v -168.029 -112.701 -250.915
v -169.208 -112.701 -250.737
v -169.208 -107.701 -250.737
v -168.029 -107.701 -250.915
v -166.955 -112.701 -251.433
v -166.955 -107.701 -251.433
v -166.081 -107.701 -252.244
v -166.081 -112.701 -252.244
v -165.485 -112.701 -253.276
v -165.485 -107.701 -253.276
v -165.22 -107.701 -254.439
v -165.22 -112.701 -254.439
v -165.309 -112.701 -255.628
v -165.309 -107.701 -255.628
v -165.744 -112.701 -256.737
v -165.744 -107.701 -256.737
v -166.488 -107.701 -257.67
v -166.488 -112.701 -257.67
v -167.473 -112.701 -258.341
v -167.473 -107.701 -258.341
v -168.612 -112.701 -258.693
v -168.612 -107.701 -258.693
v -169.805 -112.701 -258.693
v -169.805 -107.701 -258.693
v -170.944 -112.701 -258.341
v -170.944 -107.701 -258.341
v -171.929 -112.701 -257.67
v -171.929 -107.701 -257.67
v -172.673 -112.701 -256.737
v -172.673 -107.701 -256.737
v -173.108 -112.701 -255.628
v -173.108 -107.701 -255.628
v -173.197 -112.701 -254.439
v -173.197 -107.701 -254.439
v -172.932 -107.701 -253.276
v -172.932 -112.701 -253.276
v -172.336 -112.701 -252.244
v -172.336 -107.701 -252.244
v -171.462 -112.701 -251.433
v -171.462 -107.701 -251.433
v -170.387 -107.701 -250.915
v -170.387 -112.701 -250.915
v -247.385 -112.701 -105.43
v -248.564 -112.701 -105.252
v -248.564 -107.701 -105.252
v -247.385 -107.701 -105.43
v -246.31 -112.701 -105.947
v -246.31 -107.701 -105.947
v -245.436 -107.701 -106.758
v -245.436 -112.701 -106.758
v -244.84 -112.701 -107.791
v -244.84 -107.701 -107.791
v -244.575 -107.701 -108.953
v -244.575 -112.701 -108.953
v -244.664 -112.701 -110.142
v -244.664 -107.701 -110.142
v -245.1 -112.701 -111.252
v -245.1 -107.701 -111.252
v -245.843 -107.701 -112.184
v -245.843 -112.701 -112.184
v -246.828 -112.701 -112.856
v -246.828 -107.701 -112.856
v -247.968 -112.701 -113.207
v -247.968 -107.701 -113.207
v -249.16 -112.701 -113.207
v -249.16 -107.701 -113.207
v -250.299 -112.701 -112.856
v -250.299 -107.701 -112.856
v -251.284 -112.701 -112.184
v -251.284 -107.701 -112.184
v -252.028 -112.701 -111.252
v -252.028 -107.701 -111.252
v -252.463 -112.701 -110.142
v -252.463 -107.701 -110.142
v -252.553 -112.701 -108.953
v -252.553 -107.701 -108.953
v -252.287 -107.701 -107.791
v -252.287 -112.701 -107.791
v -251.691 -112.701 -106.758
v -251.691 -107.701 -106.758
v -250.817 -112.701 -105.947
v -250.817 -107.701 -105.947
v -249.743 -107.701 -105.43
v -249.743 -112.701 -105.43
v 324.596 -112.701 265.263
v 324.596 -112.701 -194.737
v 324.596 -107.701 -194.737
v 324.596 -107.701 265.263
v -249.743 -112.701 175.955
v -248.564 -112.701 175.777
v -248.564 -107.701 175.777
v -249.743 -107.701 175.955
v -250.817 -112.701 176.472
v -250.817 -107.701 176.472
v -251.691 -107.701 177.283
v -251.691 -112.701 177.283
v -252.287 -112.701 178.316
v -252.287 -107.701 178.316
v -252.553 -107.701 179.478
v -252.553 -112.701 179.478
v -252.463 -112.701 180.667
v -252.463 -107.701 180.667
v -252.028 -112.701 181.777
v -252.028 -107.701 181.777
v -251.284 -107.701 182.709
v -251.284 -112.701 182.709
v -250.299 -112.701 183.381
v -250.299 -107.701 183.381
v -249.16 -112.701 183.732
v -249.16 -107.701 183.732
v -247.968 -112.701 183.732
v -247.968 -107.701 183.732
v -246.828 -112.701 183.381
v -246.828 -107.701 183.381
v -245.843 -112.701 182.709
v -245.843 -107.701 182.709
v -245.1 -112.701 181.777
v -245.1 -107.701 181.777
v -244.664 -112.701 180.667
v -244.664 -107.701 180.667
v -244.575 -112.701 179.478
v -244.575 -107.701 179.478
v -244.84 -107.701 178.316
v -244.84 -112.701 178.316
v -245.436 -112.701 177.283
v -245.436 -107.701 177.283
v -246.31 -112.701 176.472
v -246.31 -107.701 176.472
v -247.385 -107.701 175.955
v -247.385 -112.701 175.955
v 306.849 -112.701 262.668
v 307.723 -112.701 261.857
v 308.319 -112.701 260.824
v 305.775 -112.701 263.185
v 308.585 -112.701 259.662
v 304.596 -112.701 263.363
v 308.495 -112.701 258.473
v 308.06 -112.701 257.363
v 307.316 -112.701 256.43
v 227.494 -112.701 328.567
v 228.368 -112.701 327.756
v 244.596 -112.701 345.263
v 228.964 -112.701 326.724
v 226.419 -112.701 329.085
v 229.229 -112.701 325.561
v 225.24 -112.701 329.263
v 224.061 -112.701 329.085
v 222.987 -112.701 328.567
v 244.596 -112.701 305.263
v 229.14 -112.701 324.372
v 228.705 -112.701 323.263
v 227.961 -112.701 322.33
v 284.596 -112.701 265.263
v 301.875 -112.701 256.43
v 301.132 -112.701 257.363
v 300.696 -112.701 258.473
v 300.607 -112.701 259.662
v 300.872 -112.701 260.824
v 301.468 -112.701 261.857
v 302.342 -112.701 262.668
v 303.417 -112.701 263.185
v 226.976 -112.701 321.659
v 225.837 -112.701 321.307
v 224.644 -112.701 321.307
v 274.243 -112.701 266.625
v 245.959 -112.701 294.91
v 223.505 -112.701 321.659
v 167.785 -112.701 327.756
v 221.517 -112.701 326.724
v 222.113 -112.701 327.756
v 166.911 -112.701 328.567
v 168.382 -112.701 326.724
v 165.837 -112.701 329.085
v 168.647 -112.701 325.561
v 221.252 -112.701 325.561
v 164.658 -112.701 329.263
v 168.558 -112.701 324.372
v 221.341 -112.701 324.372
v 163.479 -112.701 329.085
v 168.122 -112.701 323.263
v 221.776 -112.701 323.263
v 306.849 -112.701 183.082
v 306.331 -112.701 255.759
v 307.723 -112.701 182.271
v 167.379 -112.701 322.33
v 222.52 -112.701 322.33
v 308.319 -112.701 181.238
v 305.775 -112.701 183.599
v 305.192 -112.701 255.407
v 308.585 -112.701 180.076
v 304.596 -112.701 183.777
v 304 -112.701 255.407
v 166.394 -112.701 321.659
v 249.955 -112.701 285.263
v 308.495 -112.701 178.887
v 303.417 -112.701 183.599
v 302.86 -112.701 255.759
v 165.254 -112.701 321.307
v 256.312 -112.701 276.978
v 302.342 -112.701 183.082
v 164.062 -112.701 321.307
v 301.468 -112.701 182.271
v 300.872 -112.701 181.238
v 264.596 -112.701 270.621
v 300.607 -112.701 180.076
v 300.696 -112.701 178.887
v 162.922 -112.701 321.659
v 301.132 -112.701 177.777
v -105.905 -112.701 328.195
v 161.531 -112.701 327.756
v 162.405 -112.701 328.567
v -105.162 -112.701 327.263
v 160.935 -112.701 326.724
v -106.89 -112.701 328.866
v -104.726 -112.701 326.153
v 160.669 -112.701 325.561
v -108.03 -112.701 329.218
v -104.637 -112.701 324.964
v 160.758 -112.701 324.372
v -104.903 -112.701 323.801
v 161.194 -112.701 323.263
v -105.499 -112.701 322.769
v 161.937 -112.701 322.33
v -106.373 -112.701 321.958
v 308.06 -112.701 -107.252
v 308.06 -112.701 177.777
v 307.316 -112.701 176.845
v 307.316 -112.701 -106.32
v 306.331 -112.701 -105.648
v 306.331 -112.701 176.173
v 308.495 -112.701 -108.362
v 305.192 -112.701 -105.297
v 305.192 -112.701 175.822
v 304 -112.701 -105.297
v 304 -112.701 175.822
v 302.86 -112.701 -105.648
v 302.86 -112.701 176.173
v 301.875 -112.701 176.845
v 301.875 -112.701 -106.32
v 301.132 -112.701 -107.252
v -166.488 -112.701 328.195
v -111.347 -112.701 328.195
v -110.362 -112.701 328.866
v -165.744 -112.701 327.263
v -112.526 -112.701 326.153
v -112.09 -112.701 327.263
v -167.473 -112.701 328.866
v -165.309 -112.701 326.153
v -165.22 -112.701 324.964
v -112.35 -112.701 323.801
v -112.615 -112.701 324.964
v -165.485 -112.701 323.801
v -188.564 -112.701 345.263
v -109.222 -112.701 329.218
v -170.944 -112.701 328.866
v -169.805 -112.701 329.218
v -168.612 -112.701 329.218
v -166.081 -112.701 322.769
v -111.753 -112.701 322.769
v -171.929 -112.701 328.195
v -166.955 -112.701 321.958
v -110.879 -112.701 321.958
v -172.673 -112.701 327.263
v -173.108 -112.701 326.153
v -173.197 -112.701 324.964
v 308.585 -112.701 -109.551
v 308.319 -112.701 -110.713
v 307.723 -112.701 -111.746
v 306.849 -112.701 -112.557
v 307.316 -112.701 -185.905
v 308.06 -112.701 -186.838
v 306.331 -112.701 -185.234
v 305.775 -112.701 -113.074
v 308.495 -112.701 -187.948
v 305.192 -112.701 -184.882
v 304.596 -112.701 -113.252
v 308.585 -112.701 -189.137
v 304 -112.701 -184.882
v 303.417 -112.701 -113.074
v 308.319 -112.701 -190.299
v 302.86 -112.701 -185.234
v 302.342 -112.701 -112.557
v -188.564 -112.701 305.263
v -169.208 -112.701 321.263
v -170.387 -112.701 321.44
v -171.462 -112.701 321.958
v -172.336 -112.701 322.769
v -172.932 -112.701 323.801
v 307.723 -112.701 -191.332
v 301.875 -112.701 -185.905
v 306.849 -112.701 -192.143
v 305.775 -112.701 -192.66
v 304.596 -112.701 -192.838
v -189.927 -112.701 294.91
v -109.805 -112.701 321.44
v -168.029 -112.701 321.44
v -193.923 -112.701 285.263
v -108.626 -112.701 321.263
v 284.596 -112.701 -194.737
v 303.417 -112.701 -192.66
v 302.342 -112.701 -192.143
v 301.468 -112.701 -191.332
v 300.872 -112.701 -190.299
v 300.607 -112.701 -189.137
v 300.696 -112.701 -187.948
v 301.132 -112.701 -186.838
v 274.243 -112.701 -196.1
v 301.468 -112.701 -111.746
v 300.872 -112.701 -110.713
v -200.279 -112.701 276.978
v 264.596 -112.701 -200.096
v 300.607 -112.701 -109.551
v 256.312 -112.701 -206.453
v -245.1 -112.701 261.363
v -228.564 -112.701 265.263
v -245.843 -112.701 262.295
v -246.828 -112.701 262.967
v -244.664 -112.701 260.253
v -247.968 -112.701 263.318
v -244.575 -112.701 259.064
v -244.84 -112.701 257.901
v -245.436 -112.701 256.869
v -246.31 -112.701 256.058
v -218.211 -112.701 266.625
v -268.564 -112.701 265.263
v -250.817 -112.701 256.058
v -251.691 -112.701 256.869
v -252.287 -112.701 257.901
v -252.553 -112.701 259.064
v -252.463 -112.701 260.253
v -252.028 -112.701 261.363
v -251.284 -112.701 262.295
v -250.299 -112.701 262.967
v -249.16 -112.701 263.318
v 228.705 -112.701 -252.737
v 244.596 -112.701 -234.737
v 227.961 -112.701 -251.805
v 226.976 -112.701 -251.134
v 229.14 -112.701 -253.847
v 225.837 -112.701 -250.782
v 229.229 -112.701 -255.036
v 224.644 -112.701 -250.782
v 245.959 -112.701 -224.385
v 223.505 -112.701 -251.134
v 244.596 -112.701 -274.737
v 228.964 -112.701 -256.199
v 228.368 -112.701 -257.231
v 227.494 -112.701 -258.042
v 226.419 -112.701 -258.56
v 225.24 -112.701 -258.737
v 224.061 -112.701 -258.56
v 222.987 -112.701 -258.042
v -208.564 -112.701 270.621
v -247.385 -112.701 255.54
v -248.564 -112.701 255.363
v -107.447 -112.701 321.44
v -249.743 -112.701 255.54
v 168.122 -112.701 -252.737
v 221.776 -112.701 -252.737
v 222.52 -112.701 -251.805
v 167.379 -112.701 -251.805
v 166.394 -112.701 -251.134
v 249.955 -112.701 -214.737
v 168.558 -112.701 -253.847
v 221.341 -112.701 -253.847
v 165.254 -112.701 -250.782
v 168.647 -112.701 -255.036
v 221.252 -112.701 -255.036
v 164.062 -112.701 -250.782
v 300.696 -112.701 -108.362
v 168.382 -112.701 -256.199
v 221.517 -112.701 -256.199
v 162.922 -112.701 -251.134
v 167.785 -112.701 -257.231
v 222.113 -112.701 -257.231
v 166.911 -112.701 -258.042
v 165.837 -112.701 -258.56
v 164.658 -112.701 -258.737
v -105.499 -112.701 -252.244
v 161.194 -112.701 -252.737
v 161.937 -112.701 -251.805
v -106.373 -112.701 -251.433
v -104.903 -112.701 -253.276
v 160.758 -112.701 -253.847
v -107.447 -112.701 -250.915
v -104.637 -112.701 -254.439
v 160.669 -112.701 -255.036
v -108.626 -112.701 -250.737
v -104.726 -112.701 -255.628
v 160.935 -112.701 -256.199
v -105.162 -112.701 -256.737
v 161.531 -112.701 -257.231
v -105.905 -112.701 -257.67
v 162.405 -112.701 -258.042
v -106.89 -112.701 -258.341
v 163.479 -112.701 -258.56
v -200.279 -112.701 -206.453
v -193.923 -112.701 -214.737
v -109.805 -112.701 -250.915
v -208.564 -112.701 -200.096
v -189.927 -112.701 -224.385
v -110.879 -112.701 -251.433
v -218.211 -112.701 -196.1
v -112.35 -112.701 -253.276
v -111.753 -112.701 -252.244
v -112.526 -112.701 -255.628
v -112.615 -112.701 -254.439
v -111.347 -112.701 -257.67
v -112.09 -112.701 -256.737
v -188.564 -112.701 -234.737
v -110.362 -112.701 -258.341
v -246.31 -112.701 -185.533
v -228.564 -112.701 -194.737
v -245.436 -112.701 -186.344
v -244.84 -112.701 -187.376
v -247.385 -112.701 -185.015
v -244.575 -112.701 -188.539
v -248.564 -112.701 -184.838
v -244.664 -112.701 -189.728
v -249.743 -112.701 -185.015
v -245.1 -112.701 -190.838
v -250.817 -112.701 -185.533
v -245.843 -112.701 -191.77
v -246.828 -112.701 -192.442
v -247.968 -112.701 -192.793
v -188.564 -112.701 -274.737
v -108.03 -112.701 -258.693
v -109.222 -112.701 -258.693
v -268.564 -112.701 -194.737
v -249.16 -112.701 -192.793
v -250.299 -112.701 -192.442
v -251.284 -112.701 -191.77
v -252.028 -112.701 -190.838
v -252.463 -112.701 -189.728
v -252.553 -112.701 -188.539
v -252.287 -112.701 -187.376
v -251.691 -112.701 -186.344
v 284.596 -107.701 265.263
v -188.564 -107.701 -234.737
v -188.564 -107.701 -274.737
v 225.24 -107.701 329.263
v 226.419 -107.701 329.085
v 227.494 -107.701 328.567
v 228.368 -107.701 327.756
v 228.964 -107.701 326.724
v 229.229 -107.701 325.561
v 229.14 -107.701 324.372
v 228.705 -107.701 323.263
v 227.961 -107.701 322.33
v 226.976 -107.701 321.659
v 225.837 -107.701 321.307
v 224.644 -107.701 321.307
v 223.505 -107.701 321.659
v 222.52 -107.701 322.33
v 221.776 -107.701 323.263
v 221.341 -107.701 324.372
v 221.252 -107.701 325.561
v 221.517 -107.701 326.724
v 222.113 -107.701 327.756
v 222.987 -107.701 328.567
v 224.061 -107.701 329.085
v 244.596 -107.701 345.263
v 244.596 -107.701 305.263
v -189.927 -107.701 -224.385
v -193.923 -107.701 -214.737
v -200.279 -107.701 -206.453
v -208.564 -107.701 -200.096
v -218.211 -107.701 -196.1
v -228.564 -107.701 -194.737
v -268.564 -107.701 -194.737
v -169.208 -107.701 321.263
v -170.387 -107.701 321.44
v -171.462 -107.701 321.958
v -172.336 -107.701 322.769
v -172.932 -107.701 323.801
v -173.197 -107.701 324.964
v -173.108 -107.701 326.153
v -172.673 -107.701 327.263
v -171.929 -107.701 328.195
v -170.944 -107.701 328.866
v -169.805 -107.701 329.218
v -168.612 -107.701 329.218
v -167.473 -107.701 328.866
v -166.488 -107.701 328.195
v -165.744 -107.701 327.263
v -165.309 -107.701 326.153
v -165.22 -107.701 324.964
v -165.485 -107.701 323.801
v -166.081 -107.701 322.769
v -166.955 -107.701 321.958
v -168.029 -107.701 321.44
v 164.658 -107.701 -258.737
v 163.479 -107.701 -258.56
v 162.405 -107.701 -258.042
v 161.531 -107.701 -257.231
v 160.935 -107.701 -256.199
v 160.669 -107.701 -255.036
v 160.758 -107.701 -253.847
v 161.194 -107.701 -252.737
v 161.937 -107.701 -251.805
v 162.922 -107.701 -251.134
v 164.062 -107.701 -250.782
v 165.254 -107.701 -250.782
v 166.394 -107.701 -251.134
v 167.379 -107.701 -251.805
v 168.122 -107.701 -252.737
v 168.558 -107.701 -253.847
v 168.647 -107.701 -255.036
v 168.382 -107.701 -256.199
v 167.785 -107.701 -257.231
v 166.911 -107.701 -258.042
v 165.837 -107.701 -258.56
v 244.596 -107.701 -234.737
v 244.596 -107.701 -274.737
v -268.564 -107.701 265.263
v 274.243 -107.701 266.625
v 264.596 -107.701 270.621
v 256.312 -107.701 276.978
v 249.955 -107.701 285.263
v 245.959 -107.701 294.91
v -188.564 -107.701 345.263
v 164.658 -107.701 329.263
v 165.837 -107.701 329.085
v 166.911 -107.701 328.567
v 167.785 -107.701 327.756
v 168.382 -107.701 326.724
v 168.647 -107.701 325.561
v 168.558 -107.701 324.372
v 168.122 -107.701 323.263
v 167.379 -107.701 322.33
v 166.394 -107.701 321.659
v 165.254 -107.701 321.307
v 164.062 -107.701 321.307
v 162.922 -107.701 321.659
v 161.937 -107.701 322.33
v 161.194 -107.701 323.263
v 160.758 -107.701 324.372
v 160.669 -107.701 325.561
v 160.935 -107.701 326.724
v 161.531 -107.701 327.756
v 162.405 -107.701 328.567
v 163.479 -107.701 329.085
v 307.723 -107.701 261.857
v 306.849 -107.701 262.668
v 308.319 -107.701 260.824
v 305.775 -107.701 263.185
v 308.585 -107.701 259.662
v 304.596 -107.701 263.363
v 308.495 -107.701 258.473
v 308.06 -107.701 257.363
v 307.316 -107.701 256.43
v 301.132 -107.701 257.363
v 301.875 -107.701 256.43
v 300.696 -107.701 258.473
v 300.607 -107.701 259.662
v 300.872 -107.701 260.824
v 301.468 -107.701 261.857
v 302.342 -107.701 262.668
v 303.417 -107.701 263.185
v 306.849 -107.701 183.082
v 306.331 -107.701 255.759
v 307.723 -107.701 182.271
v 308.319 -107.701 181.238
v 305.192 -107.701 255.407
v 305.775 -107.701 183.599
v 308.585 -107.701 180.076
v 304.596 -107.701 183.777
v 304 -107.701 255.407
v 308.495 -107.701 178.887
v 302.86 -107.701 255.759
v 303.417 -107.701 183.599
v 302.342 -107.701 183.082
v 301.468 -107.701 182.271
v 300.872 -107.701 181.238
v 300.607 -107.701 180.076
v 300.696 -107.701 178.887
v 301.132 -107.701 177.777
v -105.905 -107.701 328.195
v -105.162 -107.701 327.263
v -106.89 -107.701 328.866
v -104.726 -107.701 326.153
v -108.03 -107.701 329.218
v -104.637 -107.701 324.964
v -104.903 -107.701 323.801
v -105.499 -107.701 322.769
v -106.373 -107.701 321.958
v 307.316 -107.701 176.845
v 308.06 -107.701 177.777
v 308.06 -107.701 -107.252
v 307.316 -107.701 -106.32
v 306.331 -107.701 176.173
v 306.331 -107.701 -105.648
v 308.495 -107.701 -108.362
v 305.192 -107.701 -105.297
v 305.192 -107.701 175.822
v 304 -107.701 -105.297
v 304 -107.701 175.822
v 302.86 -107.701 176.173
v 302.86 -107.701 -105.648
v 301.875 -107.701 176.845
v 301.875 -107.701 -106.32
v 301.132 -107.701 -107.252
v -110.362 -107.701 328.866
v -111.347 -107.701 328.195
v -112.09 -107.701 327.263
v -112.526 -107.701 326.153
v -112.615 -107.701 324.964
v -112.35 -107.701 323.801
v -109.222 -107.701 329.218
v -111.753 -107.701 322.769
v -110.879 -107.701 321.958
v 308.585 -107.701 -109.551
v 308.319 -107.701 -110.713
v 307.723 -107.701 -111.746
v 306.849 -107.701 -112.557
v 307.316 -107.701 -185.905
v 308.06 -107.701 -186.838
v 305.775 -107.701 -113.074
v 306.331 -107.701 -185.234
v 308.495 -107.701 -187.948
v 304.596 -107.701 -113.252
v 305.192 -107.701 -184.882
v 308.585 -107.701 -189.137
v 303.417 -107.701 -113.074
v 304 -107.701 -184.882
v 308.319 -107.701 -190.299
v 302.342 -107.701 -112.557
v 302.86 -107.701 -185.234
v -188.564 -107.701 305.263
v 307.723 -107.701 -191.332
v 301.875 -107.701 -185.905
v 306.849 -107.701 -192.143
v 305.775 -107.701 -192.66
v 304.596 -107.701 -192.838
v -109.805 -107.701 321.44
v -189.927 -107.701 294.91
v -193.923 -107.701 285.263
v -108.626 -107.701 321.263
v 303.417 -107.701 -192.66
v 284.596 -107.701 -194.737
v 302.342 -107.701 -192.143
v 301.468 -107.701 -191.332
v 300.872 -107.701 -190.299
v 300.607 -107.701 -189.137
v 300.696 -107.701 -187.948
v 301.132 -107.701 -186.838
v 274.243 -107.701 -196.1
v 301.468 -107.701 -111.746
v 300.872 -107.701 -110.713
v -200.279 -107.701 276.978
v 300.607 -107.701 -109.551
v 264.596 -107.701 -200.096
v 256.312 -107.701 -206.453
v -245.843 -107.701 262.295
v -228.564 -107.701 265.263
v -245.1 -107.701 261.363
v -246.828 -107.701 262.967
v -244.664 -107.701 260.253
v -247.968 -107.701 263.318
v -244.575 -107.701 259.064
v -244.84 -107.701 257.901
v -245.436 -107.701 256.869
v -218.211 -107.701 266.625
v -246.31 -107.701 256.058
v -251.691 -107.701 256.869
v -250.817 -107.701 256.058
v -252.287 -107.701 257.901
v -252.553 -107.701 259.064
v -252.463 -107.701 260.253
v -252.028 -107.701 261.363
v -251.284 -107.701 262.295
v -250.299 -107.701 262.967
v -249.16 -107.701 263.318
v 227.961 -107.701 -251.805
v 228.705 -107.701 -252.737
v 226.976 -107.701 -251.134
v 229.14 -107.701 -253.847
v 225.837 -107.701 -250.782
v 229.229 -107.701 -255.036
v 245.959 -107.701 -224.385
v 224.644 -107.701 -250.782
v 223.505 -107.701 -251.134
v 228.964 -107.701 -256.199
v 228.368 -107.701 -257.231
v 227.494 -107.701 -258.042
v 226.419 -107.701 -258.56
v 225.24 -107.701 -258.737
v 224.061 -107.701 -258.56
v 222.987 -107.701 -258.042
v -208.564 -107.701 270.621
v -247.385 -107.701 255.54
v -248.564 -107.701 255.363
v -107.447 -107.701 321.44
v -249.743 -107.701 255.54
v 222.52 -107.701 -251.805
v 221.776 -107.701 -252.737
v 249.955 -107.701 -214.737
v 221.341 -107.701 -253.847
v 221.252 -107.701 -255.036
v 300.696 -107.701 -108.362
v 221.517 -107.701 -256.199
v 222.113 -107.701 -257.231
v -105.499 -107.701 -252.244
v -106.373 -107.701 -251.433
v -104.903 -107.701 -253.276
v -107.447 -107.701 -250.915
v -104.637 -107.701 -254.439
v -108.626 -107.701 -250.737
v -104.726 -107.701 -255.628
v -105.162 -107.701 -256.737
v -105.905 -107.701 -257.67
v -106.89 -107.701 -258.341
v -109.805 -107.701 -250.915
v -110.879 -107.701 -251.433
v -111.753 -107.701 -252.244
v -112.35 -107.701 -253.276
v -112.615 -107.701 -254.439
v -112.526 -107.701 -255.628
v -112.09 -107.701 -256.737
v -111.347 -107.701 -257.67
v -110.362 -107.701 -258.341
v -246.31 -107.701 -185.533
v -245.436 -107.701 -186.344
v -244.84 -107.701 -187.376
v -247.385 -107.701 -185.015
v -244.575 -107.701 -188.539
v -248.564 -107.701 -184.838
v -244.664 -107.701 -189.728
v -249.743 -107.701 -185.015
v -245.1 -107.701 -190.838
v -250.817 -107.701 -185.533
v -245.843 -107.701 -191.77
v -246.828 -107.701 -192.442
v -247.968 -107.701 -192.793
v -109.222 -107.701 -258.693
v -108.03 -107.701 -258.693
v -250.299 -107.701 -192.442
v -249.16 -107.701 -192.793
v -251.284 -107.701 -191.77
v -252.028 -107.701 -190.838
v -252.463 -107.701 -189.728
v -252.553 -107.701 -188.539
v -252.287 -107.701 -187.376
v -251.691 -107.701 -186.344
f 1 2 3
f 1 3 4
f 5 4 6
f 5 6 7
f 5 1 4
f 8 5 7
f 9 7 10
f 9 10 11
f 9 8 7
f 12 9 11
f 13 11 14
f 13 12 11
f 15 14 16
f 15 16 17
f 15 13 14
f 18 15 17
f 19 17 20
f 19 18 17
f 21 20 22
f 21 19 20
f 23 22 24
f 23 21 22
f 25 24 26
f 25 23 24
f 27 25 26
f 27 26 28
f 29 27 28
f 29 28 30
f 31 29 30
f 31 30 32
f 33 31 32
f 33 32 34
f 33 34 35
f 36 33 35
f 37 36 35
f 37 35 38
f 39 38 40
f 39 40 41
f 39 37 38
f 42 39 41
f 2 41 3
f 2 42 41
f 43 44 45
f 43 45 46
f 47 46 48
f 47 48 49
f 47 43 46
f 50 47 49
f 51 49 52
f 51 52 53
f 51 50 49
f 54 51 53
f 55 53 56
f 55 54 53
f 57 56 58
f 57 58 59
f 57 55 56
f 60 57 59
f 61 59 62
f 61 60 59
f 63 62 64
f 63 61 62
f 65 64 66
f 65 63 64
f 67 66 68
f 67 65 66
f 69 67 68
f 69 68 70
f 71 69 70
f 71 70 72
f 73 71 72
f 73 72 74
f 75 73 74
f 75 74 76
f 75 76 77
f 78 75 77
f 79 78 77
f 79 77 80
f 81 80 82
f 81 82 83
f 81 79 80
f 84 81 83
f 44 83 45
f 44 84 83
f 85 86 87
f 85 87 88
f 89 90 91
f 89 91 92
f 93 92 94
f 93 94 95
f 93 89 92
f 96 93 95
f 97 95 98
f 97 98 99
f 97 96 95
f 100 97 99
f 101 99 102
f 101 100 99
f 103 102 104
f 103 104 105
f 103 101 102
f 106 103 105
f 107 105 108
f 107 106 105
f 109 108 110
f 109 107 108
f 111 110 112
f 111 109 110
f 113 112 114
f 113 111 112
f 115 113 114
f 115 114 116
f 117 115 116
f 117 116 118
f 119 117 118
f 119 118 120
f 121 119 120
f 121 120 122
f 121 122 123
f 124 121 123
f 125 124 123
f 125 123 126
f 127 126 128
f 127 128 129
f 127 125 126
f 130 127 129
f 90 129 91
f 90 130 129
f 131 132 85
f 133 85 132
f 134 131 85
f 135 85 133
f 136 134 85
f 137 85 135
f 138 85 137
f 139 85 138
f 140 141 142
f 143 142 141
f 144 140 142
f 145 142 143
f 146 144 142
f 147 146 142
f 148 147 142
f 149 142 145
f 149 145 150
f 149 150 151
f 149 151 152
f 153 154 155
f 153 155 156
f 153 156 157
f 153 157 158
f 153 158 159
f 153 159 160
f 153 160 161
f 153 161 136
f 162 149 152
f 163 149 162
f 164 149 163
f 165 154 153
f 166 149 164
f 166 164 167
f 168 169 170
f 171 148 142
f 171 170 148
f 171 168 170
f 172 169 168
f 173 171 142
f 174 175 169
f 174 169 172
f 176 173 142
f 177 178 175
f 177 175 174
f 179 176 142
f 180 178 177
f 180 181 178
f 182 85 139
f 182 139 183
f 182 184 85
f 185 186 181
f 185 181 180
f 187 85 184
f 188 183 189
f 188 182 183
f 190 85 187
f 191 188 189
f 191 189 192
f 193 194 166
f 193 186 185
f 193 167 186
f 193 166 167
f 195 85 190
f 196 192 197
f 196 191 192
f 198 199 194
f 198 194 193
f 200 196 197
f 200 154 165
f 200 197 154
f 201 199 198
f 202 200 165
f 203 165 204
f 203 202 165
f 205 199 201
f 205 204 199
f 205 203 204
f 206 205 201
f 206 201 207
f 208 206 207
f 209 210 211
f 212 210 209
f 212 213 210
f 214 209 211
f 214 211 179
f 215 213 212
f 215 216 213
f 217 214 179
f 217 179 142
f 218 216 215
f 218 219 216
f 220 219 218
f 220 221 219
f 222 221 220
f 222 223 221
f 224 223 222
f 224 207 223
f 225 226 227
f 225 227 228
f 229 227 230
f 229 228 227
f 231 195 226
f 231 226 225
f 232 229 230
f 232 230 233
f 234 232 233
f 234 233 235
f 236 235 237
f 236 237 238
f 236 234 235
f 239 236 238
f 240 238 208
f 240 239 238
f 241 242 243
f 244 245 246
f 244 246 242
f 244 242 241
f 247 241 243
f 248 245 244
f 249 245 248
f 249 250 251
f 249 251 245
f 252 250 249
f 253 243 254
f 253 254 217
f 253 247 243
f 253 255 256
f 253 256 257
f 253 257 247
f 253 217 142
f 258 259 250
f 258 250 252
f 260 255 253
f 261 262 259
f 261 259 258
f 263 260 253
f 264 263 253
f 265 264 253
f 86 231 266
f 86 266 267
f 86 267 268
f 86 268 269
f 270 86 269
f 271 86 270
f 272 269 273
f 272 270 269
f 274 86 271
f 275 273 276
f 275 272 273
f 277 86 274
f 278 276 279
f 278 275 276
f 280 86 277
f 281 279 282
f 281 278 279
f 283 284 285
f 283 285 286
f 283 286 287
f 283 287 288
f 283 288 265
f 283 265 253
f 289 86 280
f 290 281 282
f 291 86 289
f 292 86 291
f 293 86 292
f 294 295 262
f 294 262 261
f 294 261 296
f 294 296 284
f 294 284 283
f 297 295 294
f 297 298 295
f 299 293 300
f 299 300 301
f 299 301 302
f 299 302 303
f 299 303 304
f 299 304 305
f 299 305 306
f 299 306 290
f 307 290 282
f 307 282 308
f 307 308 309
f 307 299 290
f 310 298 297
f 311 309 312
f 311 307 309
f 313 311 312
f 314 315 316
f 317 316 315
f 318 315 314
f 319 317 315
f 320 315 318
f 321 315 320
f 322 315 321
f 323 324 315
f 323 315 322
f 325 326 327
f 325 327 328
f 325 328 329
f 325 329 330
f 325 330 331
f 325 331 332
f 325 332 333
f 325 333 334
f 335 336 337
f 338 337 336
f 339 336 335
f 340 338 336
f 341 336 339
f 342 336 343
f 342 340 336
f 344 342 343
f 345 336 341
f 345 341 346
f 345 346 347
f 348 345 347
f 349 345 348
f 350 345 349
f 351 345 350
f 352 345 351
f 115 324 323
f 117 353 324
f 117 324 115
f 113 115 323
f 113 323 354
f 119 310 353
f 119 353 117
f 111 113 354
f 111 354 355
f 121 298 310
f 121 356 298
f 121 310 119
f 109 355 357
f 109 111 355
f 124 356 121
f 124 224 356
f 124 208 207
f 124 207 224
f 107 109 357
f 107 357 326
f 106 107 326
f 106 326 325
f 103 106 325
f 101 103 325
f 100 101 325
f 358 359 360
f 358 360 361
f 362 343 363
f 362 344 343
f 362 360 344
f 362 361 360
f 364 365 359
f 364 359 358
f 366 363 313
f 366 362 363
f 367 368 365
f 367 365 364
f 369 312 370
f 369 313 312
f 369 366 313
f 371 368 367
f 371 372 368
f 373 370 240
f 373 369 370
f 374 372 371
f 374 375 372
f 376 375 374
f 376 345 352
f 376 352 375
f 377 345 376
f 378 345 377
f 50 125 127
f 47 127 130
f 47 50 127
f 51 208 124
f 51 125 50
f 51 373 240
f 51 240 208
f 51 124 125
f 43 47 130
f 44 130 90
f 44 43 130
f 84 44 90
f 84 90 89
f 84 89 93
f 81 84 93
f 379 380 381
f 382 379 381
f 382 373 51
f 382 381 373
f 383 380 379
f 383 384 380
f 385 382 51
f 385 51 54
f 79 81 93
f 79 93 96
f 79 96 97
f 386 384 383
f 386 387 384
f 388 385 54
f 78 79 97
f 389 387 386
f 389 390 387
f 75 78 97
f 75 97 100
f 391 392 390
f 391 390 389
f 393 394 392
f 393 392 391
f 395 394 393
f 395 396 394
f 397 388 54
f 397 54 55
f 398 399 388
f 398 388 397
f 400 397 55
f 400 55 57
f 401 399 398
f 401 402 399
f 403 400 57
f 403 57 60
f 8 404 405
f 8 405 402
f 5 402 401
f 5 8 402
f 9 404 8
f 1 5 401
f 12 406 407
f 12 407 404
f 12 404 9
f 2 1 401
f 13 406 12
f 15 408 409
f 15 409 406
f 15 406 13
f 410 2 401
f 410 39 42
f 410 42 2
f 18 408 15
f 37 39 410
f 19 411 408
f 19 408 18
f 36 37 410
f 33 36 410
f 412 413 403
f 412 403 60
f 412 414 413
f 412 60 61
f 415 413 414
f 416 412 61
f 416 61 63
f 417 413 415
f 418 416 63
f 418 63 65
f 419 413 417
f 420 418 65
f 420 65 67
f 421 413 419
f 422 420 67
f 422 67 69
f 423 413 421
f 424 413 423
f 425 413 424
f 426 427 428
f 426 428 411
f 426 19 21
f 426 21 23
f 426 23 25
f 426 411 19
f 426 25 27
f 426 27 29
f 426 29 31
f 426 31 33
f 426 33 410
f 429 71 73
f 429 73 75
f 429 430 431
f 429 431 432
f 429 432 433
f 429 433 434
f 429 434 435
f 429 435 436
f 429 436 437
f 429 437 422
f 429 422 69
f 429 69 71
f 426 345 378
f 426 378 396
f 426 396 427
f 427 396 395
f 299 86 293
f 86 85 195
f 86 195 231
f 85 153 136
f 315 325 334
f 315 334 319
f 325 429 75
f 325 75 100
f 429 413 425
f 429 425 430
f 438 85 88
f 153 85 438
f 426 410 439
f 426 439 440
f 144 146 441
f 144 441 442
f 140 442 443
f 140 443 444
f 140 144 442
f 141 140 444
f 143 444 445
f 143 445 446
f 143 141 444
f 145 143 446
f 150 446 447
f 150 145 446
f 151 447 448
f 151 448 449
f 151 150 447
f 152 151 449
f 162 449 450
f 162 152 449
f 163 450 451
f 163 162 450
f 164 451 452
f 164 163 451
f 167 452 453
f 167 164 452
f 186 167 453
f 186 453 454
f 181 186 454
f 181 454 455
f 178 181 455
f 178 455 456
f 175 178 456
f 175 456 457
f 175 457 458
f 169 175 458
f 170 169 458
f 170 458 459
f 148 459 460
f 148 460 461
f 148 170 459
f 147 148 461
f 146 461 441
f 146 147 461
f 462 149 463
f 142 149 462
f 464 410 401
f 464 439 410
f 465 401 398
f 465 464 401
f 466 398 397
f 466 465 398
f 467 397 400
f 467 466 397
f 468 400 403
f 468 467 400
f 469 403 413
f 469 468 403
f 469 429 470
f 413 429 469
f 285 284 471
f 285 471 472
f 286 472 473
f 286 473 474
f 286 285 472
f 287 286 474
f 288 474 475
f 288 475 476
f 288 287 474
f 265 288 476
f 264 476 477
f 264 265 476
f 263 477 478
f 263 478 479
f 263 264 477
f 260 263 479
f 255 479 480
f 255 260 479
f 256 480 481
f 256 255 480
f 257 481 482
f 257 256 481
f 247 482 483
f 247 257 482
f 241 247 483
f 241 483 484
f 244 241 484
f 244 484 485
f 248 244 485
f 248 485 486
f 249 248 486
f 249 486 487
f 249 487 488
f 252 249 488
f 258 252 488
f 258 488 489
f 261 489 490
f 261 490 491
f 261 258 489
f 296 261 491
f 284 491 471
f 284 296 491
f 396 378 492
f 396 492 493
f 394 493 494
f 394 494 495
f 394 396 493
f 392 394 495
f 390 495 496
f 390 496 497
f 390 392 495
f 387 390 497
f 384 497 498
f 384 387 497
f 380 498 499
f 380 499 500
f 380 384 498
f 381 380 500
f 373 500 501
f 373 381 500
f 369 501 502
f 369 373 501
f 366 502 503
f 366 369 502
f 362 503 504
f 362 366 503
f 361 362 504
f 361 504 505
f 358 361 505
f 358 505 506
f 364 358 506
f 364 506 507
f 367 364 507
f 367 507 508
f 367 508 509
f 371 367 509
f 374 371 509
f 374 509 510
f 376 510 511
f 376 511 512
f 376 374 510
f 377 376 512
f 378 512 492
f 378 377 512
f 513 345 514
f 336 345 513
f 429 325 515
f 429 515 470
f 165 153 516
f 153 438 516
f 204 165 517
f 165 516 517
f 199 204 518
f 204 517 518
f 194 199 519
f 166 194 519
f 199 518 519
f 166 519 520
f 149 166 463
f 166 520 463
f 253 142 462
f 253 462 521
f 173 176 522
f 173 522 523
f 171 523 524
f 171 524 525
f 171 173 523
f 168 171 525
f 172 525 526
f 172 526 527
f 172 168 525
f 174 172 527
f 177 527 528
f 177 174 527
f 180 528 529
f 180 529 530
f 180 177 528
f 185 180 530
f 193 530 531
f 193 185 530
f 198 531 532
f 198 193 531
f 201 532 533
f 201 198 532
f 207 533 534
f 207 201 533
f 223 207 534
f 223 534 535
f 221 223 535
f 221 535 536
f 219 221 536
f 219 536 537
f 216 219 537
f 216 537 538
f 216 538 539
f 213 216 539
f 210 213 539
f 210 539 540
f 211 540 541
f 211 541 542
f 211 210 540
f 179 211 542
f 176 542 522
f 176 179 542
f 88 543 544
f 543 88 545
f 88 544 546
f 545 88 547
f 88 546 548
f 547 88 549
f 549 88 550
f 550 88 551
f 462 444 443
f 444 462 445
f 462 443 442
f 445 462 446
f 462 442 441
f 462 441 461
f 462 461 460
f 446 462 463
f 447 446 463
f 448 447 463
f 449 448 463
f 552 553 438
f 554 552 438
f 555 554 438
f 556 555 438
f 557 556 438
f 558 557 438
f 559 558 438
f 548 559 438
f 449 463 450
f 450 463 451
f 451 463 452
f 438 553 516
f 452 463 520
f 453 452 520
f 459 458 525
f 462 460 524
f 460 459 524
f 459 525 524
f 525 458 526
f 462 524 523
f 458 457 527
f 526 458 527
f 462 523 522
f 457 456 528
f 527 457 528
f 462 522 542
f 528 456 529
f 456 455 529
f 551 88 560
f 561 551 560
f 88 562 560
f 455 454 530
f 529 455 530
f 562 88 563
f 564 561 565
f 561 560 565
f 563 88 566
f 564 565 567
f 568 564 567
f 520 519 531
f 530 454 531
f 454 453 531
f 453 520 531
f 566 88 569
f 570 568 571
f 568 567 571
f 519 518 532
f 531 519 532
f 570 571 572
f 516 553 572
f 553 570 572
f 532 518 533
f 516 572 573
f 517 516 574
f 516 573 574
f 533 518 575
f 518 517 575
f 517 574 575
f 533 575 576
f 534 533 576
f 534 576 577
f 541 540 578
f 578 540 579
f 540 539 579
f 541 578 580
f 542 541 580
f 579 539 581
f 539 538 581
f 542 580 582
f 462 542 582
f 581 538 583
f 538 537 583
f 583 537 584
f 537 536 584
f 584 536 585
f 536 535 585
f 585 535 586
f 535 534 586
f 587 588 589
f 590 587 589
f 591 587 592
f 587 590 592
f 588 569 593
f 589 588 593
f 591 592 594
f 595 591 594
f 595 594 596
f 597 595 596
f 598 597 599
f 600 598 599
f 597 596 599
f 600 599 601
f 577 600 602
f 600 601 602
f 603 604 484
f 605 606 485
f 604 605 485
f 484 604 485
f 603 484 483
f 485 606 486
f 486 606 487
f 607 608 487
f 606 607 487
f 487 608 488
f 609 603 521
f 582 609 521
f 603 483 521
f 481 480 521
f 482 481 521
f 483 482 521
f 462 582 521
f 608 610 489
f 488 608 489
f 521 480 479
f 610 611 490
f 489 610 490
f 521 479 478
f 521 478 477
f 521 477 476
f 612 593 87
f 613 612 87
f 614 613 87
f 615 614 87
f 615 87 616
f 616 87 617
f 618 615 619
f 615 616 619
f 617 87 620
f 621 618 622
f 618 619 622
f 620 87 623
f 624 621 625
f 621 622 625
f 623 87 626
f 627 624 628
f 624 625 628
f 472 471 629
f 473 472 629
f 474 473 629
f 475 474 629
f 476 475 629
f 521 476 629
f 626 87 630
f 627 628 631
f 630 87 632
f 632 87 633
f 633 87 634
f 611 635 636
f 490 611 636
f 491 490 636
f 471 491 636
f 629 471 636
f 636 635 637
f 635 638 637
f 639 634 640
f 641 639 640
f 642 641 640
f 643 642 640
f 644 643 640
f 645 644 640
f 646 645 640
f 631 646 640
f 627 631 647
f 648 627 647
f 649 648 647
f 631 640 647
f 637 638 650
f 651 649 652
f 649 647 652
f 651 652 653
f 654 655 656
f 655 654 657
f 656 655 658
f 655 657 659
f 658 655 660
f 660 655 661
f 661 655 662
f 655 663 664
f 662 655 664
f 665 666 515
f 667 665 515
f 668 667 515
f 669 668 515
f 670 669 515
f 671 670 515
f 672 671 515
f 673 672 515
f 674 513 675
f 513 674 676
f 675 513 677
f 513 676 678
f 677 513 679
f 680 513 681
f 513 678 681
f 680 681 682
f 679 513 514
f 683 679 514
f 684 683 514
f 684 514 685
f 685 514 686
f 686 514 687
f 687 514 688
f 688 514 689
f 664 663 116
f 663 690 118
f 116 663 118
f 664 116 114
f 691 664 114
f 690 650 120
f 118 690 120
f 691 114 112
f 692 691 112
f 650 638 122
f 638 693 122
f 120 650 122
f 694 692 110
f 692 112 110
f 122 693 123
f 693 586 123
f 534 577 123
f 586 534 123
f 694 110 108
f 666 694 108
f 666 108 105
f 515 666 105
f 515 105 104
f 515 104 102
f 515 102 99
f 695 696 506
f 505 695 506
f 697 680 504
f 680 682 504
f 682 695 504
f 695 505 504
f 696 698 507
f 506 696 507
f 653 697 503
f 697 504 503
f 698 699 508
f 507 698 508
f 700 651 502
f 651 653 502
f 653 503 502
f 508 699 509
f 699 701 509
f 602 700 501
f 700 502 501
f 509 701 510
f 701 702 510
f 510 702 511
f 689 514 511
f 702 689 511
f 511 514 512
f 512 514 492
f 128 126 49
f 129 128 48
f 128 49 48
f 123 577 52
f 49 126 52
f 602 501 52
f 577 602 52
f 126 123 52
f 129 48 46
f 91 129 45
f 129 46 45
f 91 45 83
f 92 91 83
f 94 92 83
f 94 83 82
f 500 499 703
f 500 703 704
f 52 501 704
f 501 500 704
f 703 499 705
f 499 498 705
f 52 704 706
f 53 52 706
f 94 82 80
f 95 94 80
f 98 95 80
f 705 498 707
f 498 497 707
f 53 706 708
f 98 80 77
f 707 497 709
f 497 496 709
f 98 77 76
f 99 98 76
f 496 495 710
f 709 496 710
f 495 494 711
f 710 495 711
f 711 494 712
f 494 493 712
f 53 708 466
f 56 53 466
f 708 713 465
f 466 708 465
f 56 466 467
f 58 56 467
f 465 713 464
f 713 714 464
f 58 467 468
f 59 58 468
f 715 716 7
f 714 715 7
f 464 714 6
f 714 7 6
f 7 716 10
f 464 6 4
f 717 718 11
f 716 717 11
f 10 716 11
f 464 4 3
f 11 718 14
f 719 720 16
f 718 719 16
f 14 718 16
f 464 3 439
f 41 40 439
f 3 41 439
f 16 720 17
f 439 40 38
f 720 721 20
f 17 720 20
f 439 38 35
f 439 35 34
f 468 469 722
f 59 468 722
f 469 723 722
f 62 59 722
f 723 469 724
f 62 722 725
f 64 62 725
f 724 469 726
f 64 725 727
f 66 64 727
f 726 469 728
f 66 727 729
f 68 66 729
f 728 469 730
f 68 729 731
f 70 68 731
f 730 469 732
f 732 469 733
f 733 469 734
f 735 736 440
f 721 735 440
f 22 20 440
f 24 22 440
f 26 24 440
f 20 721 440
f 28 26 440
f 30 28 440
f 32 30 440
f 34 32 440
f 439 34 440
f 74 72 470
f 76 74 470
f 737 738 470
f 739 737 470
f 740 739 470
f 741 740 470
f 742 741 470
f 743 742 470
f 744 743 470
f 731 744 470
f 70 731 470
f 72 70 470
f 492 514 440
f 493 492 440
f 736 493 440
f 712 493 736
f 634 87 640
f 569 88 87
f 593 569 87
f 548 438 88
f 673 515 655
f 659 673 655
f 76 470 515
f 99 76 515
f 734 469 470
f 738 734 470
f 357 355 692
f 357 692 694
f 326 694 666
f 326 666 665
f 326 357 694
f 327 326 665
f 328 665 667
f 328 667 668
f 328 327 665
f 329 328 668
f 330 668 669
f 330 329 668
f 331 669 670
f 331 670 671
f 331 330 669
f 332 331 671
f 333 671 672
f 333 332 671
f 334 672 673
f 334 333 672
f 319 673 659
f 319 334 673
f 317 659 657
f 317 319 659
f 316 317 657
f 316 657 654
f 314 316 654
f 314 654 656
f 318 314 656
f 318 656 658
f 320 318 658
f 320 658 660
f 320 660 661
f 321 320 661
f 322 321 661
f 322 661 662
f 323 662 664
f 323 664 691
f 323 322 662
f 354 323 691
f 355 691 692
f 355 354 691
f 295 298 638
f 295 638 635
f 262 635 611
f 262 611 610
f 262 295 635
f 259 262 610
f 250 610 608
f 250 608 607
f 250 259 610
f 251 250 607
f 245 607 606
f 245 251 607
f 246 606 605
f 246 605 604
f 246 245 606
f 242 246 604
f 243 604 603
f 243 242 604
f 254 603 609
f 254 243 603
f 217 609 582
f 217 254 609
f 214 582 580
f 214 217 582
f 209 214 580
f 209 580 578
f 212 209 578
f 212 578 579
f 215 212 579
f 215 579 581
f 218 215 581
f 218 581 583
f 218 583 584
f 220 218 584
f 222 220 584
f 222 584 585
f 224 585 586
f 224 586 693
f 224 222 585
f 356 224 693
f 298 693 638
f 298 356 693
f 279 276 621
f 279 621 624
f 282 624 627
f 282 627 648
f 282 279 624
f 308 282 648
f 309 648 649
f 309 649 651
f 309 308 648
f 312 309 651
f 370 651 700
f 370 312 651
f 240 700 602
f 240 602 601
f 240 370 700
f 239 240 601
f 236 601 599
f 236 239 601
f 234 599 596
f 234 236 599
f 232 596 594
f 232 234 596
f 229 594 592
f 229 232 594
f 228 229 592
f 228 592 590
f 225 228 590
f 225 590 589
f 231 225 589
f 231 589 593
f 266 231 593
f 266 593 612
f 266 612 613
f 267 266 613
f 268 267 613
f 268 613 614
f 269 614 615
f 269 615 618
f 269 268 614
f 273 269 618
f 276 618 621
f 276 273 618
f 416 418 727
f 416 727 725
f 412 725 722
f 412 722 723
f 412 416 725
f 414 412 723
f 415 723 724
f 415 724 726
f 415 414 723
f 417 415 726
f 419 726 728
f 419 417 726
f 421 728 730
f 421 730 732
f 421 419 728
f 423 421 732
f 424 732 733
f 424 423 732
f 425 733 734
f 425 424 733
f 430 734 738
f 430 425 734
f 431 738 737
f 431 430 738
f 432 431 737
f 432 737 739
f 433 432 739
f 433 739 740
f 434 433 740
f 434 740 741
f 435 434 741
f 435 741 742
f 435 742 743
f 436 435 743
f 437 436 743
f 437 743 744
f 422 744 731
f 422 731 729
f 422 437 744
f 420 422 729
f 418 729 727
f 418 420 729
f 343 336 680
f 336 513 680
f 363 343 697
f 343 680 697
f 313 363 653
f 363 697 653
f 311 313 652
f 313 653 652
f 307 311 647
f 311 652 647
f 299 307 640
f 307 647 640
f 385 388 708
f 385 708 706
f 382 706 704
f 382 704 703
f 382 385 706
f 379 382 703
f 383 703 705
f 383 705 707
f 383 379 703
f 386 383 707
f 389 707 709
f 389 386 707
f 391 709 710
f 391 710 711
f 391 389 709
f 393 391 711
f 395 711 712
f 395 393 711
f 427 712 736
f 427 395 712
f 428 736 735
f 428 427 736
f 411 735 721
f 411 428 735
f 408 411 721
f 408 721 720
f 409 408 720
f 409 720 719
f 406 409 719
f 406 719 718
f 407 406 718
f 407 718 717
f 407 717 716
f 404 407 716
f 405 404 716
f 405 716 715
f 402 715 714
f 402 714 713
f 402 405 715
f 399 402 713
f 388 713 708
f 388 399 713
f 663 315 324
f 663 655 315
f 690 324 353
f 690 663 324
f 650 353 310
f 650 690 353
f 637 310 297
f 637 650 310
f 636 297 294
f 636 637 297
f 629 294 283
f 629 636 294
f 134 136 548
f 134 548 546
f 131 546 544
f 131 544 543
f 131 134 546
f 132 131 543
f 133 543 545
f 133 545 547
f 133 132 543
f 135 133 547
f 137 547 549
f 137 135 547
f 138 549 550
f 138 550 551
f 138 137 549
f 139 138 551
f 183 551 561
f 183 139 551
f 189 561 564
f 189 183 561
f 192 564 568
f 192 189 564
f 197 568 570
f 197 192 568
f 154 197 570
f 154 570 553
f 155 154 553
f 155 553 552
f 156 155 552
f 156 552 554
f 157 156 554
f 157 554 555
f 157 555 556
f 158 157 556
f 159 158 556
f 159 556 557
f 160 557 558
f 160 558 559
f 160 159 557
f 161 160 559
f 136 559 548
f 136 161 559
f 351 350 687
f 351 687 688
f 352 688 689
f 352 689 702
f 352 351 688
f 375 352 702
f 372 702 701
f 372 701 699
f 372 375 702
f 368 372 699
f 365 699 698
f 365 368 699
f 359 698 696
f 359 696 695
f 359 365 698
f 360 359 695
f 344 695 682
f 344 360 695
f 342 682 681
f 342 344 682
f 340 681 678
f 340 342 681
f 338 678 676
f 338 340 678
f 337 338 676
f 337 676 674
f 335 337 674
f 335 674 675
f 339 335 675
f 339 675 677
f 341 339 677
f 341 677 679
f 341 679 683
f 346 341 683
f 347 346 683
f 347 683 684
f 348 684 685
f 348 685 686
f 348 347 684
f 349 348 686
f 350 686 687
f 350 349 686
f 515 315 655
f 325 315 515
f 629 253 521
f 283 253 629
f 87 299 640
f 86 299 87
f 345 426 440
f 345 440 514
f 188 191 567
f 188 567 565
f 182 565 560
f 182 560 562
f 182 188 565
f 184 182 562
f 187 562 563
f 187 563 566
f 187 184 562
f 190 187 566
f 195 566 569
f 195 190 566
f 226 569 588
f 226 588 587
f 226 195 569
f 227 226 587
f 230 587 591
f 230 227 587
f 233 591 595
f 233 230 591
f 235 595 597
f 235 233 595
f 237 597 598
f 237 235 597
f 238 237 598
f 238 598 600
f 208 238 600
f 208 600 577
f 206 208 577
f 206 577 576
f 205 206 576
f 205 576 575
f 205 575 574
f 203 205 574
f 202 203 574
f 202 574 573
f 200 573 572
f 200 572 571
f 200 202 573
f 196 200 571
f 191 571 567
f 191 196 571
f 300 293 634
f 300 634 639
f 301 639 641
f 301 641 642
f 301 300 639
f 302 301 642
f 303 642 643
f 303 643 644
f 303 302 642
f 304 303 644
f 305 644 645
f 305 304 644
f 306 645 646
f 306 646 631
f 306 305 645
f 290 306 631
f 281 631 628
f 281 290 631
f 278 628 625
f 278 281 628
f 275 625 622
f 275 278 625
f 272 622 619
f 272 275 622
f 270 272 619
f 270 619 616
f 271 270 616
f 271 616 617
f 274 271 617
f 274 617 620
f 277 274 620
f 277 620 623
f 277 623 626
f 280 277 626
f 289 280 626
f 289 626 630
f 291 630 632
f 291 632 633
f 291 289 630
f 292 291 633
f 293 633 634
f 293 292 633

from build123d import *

# Parameters (mm, degrees)
SKETCH2_R           = 4
BOSS_EXTRUDE1_DEPTH = 5
FILLET1_R           = 40


with BuildPart() as part:
    # Sketch2 → Boss-Extrude1 (new body)
    with BuildSketch(Plane(origin=(0, -112.700994014, 0), x_dir=(1, 0, 0), z_dir=(0, 1, 0))):
        Polygon((-188.563755175, 274.737493623), (244.595772671, 274.737493623), (244.595772671, 194.737493623), (324.595772671, 194.737493623), (324.595772671, -265.262506377), (244.595772671, -265.262506377), (244.595772671, -345.262506377), (-188.563755175, -345.262506377), (-188.563755175, -265.262506377), (-268.563755175, -265.262506377), (-268.563755175, 194.737493623), (-188.563755175, 194.737493623), align=None)
        with Locations(Location((-169.208419226, 254.737493623, 0), (0, 0, 270))):
            Circle(SKETCH2_R, mode=Mode.SUBTRACT)
        with Locations(Location((-108.626011264, 254.737493623, 0), (0, 0, 270))):
            Circle(SKETCH2_R, mode=Mode.SUBTRACT)
        with Locations(Location((-248.563755175, 188.837673249, 0), (0, 0, 270))):
            Circle(SKETCH2_R, mode=Mode.SUBTRACT)
        with Locations(Location((-248.563755175, 109.252031995, 0), (0, 0, 270))):
            Circle(SKETCH2_R, mode=Mode.SUBTRACT)
        with Locations(Location((304.595772671, 109.252031995, 0), (0, 0, 90))):
            Circle(SKETCH2_R, mode=Mode.SUBTRACT)
        with Locations(Location((164.658028761, 254.737493623, 0), (0, 0, 90))):
            Circle(SKETCH2_R, mode=Mode.SUBTRACT)
        with Locations(Location((225.240436722, 254.737493623, 0), (0, 0, 90))):
            Circle(SKETCH2_R, mode=Mode.SUBTRACT)
        with Locations(Location((304.595772671, 188.837673249, 0), (0, 0, 90))):
            Circle(SKETCH2_R, mode=Mode.SUBTRACT)
        with Locations(Location((304.595772671, -259.362686002, 0), (0, 0, 270))):
            Circle(SKETCH2_R, mode=Mode.SUBTRACT)
        with Locations(Location((225.240436722, -325.262506377, 0), (0, 0, 270))):
            Circle(SKETCH2_R, mode=Mode.SUBTRACT)
        with Locations(Location((164.658028761, -325.262506377, 0), (0, 0, 270))):
            Circle(SKETCH2_R, mode=Mode.SUBTRACT)
        with Locations(Location((304.595772671, -179.777044749, 0), (0, 0, 270))):
            Circle(SKETCH2_R, mode=Mode.SUBTRACT)
        with Locations(Location((-248.563755175, -179.777044749, 0), (0, 0, 90))):
            Circle(SKETCH2_R, mode=Mode.SUBTRACT)
        with Locations(Location((-248.563755175, -259.362686002, 0), (0, 0, 90))):
            Circle(SKETCH2_R, mode=Mode.SUBTRACT)
        with Locations(Location((-108.626011264, -325.262506377, 0), (0, 0, 90))):
            Circle(SKETCH2_R, mode=Mode.SUBTRACT)
        with Locations(Location((-169.208419226, -325.262506377, 0), (0, 0, 90))):
            Circle(SKETCH2_R, mode=Mode.SUBTRACT)
    extrude(amount=BOSS_EXTRUDE1_DEPTH)

    # Fillet1
    fillet1_edges = [part.edges().sort_by_distance(p)[0] for p in [
        (244.595772671, -110.200994014, -194.737493623),
        (244.595772671, -110.200994014, 265.262506377),
        (-188.563755175, -110.200994014, 265.262506377),
        (-188.563755175, -110.200994014, -194.737493623),
    ]]
    fillet(fillet1_edges, radius=FILLET1_R)


solid = part.part
